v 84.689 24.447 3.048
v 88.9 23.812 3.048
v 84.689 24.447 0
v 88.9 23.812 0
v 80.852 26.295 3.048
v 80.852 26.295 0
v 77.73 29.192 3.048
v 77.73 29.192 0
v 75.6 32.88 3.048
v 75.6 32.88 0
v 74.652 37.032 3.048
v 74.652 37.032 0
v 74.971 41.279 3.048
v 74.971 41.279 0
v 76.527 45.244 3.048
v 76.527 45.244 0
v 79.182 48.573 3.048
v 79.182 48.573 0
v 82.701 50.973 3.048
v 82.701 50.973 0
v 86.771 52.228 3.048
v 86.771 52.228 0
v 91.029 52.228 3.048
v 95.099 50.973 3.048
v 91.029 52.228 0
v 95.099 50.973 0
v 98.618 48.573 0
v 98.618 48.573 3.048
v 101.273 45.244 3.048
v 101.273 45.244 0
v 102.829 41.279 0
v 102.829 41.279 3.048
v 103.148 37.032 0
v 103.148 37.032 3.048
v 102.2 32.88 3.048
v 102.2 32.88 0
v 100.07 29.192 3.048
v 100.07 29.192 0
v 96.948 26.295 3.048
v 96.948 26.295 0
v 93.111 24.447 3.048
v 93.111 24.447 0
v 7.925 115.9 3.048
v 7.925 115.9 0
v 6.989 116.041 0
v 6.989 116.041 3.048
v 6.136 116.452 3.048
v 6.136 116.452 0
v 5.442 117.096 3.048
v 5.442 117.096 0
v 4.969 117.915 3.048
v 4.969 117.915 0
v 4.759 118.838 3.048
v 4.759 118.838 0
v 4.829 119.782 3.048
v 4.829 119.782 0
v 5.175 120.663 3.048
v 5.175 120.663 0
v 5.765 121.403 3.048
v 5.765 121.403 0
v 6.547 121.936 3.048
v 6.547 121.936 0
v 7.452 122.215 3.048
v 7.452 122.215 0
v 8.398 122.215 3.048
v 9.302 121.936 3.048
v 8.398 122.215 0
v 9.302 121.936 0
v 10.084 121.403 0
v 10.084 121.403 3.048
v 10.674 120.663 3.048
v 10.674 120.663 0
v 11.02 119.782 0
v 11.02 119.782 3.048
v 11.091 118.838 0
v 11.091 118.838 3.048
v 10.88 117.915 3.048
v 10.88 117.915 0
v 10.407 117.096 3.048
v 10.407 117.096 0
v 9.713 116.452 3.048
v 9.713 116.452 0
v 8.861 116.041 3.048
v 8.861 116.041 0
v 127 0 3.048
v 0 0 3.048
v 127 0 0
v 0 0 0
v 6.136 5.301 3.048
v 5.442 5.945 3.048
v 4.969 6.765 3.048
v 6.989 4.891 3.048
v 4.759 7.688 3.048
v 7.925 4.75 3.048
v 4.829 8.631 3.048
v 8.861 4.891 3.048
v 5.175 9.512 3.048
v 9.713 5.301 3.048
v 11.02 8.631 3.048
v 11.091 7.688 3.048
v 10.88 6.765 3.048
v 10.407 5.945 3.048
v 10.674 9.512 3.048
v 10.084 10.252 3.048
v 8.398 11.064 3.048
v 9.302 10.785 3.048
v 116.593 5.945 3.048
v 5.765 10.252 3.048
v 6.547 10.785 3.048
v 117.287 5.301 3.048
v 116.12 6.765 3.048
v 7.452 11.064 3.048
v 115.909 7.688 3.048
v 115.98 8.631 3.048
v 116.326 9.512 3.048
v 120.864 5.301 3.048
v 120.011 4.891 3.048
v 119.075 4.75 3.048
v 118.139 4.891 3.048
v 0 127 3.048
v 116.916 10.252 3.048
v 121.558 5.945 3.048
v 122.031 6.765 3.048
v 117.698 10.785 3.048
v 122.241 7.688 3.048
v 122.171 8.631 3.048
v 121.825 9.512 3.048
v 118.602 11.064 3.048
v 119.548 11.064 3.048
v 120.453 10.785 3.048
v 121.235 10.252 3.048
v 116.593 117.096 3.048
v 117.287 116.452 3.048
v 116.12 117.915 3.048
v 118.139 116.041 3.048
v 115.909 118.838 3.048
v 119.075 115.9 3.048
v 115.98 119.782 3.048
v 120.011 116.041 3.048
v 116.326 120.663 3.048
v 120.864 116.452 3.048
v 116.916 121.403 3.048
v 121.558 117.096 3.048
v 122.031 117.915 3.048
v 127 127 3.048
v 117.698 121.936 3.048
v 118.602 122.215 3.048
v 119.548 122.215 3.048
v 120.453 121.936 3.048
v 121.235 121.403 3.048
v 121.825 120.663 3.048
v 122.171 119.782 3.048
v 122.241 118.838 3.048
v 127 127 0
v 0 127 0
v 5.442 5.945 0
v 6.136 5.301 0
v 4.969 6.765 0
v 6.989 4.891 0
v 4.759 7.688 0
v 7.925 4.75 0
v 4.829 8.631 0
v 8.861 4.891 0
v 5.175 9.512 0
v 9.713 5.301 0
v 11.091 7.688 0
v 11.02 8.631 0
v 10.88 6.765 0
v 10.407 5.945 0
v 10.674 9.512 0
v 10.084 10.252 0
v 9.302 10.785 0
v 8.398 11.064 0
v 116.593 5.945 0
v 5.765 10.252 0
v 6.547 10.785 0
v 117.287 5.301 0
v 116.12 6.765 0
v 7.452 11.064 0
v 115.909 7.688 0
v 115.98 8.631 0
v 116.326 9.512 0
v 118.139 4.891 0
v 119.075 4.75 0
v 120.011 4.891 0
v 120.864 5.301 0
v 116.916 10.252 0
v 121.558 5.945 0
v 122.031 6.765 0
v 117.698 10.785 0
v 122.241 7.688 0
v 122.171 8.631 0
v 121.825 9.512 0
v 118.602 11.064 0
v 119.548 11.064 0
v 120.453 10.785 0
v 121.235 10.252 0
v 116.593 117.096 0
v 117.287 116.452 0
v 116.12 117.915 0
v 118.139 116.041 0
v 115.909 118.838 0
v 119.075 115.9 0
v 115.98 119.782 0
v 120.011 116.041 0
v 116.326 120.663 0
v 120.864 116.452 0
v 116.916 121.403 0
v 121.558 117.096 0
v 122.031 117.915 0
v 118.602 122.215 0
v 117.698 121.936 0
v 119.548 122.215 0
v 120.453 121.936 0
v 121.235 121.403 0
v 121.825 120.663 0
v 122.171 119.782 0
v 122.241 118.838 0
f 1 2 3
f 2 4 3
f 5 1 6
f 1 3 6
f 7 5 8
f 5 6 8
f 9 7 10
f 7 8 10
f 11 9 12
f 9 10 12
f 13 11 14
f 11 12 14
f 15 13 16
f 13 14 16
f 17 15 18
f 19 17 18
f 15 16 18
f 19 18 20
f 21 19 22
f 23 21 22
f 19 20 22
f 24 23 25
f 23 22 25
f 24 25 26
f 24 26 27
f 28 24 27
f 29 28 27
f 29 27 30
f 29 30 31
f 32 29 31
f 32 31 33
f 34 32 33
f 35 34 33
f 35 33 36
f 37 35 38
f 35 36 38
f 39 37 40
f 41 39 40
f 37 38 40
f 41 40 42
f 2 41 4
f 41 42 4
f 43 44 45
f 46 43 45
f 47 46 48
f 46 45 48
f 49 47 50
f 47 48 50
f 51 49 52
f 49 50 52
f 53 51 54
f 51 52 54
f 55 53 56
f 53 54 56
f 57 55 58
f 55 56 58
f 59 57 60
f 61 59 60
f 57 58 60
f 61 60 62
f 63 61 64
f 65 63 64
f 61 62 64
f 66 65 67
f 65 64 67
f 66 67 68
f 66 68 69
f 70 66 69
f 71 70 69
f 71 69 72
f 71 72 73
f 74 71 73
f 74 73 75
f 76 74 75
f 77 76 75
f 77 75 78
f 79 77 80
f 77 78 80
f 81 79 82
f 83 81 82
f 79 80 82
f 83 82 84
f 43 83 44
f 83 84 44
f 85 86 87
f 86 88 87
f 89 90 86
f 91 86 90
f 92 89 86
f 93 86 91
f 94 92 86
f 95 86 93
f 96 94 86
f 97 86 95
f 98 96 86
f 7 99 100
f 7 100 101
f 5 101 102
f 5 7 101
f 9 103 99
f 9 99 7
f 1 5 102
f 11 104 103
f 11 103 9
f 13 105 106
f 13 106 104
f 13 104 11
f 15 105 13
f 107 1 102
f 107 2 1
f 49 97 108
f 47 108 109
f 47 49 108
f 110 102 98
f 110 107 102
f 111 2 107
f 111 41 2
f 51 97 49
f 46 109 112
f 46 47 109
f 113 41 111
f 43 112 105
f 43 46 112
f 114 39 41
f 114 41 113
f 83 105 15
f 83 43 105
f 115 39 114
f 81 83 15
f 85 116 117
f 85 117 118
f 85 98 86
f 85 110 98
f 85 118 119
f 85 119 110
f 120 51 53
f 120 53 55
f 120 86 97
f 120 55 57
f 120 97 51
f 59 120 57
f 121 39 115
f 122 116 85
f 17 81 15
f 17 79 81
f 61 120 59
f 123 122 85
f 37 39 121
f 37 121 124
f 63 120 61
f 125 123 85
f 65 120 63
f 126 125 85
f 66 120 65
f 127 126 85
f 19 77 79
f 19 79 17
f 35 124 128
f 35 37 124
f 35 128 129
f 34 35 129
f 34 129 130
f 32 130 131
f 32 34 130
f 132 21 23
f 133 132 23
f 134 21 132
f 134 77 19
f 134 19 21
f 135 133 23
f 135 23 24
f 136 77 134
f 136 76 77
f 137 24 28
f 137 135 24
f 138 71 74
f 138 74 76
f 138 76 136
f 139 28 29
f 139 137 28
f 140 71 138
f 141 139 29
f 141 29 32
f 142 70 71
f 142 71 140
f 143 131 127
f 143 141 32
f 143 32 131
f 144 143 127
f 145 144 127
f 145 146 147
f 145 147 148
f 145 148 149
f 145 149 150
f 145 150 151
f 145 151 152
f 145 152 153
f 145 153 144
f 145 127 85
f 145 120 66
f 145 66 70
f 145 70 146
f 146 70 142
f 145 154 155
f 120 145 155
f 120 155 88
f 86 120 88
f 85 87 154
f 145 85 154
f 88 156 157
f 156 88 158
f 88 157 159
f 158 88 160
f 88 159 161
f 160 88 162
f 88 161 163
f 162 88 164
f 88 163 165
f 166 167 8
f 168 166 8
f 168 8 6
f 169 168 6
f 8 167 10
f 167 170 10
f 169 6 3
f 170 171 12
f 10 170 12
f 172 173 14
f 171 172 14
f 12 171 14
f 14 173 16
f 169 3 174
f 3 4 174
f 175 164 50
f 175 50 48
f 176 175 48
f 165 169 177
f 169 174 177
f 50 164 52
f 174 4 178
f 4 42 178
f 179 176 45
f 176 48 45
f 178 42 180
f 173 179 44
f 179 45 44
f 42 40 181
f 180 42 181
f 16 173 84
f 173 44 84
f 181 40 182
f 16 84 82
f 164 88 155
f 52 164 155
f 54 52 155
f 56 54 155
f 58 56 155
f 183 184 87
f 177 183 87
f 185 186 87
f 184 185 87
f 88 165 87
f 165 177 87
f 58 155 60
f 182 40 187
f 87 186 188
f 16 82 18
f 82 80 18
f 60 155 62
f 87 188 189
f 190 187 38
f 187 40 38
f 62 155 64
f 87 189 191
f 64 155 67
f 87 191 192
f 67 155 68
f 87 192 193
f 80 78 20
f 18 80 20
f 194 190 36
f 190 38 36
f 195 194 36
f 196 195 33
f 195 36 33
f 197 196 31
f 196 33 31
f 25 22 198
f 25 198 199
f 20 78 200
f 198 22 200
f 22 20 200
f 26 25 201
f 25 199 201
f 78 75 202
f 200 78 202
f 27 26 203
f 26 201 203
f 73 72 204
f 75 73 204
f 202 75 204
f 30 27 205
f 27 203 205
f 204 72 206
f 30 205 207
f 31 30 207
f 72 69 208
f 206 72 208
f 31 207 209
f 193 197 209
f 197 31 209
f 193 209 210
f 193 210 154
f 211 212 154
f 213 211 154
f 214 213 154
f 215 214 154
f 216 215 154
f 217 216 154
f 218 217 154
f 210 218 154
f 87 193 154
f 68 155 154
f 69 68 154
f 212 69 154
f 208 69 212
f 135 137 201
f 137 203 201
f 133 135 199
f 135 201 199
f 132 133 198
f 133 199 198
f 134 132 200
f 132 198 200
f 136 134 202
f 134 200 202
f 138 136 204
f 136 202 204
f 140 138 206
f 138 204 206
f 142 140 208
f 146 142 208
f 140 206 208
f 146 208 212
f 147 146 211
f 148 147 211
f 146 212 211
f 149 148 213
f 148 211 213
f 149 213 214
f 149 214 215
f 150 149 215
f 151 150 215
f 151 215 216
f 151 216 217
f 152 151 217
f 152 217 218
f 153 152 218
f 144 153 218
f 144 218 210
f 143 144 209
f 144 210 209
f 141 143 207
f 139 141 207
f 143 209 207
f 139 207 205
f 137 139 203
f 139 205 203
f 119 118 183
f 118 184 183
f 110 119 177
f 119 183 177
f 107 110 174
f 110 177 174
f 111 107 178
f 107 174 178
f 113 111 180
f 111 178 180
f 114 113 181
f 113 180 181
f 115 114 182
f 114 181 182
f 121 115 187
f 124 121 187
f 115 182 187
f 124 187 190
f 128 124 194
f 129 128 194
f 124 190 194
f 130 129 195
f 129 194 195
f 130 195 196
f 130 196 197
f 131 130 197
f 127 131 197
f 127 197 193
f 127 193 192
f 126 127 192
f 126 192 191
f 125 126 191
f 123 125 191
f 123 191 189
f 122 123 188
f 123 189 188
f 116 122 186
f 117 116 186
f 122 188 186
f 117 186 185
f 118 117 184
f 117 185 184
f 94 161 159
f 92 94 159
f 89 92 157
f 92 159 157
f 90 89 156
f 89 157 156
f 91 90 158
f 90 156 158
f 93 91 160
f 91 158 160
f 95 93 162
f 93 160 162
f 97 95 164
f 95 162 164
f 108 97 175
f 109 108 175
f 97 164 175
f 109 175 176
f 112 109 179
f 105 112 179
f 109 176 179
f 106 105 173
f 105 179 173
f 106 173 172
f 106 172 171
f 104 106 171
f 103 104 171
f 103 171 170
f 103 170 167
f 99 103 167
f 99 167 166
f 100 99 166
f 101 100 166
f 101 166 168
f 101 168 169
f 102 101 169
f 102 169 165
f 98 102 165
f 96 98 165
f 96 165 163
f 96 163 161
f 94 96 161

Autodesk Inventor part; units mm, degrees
ref_plane "YZ Plane" through (0, 0, 0) normal (1, 0, 0) x (0, 1, 0)
ref_plane "XZ Plane" through (0, 0, 0) normal (0, 1, 0) x (-1, 0, 0)
ref_plane "XY Plane" through (0, 0, 0) normal (0, 0, 1) x (1, 0, 0)
sketch "Sketch1" plane through (0, 0, 0) normal (0, 0, 1) x (1, 0, 0)
  line L0 (0, 0) -> (127, 0)
  line L1 (127, 0) -> (127, 127)
  line L2 (127, 127) -> (0, 127)
  line L3 (0, 127) -> (0, 0)
  dimension "d0" = 127
extrude "Plate1" add sketch "Sketch1" along normal blind 3.048
sketch "gbmh_sketch" plane through (0, 0, 3.048) normal (0, 0, 1) x (1, 0, 0)
  line L0 (7.9248, 119.0752) -> (119.0752, 119.0752) construction
  line L1 (127, 127) -> (0, 127) construction
  line L2 (119.0752, 119.0752) -> (119.0752, 7.9248) construction
  line L3 (119.0752, 7.9248) -> (7.9248, 7.9248) construction
  line L4 (7.9248, 7.9248) -> (7.9248, 119.0752) construction
  line L5 (7.9248, 119.0752) -> (7.9248, 127) construction
  line L6 (7.9248, 119.0752) -> (0, 119.0752) construction
  line L7 (0, 127) -> (0, 0) construction
  line L8 (119.0752, 7.9248) -> (127, 7.9248) construction
  line L9 (127, 0) -> (127, 127) construction
  line L10 (119.0752, 7.9248) -> (119.0752, 0) construction
  dimension "d2" = 111.1504
  dimension "d3" = 111.1504
  dimension "d4" = 111.1504
  dimension "d5" = 111.1504
hole "gbmh" at (7.9248, 119.0752, 3.048) at (7.9248, 7.9248, 3.048) at (119.0752, 7.9248, 3.048) at (119.0752, 119.0752, 3.048) direction (0, 0, -1) diameter 6.35 depth 3.048 tip angle 118
sketch "bearing_hole_sketch" plane through (0, 0, 3.048) normal (0, 0, 1) x (1, 0, 0)
  line L0 (127, 0) -> (0, 0) projected
  line L1 (127, 127) -> (127, 0) projected
  point P0 (88.9, 38.1)
  dimension "d13" = 38.1
  dimension "d14" = 38.1
hole "ss_bearing_hole" at (88.9, 38.1, 3.048) direction (0, 0, -1) diameter 28.575 depth 3.048 tip angle 118
equation "\"d6\" = gb_mh_diameter"
equation "\"d11\" = Thickness"
equation "\"d15\" = gb_bearing_diameter"
equation "\"d20\" = Thickness"
equation "\"BendRadius\" = Thickness"
equation "\"BendReliefWidth\" = Thickness"
equation "\"BendReliefDepth\" = 0.5 * Thickness"
equation "\"CornerReliefSize\" = 4 * Thickness"
equation "\"MinimumRemnant\" = 2 * Thickness"
equation "\"TransitionRadius\" = BendRadius"
equation "\"JacobiRadiusSize\" = BendRadius"
equation "\"GapSize\" = Thickness"
equation "\"d1\" = BendRadius"
equation "\"gb_mh_seperation\" = 111.1504"
equation "\"gb_mh_diameter\" = 6.35"
equation "\"gb_axle_from_edge\" = 38.1"
equation "\"gb_width\" = 127"
equation "\"gb_bearing_diameter\" = 28.575"
equation "\"gb_to_bottom_of_side_assembly\" = 4.7752"
equation "\"gb_mh_seperation_alt\" = 111.125"
equation "\"gb_axle_from_edge_alt\" = 43.1546"
equation "\"Thickness\" = 3.048"
properties part number "gearboxbearingplate(gbpb)" material "Aluminum 6061"
